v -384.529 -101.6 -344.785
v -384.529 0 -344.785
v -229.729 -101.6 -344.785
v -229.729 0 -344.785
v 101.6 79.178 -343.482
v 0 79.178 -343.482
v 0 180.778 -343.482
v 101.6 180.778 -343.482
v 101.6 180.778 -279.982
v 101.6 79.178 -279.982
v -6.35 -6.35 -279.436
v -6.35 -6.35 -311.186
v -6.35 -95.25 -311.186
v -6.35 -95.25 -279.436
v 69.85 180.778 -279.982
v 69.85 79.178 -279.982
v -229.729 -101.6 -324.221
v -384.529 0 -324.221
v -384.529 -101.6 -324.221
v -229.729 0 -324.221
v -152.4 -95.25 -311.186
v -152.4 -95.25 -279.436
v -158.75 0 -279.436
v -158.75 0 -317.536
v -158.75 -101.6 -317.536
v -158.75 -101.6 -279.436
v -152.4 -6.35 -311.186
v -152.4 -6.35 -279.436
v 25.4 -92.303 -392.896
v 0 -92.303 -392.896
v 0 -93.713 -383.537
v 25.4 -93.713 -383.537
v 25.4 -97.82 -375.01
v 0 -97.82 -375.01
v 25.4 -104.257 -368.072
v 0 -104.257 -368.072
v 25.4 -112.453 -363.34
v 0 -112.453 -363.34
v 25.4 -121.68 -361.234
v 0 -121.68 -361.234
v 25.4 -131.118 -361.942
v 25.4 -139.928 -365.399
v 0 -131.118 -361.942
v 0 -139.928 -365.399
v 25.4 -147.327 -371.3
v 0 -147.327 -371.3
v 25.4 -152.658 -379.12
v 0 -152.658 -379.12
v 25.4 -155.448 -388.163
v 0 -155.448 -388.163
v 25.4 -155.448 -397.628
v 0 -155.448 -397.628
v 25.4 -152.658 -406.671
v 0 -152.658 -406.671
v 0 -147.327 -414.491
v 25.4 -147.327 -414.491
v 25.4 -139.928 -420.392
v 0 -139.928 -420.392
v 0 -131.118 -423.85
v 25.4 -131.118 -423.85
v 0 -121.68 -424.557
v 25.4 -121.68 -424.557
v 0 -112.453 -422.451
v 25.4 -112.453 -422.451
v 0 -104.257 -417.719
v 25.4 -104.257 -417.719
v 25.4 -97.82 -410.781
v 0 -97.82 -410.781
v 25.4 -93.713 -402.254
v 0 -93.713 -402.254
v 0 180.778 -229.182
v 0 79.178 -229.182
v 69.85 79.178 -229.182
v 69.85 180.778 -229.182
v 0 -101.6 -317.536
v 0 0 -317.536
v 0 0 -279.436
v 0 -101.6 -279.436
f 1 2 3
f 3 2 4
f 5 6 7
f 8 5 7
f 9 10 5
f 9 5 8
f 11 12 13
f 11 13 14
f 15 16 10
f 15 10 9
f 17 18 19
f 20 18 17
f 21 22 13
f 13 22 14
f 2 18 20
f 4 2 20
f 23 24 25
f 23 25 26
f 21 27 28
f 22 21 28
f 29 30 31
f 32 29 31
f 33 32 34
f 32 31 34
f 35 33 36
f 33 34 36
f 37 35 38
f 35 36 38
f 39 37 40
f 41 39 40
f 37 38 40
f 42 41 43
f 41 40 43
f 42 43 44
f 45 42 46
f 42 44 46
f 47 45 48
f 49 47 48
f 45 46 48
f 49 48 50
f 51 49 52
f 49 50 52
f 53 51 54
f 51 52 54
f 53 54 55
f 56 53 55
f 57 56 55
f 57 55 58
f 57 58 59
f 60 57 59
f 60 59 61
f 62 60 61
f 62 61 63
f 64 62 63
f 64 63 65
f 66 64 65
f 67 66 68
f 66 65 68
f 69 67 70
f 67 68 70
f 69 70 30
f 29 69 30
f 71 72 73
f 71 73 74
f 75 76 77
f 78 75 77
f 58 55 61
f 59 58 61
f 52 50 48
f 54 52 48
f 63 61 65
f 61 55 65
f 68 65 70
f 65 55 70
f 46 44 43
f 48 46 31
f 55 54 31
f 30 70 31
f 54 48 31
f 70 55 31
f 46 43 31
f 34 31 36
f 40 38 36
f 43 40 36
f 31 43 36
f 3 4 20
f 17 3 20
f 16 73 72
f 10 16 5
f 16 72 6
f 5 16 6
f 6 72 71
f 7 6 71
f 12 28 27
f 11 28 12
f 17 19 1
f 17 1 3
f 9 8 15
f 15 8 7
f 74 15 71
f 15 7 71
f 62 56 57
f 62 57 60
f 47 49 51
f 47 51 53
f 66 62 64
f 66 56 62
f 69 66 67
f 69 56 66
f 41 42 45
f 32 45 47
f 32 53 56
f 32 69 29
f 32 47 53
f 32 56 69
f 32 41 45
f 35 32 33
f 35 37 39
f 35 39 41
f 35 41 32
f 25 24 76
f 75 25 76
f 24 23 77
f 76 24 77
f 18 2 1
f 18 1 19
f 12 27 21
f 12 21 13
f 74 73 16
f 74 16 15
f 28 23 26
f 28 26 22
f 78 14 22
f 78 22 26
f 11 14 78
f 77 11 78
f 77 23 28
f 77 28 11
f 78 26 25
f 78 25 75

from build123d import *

# Parameters (mm, degrees)
F0_W     = 101.6
F0_H     = 63.5
F1_DEPTH = 101.6
F0_H_2   = 50.8
F2_DEPTH = 69.85
F3_W     = 158.75
F3_H     = 38.1
F4_DEPTH = 101.6
F3_W_2   = 154.7997891903
F3_H_2   = 20.5638110638
F5_R     = 31.75
F6_DEPTH = 25.4
F7_T     = -6.35


with BuildPart() as f1:
    # F0 (on Right) → F1 (new body)
    with BuildSketch(Plane.YZ):
        with Locations((129.9776777284, -311.7317557335)):
            Rectangle(F0_W, F0_H)
    extrude(amount=F1_DEPTH)

    # F0 (on Right) → F2 (join)
    with BuildSketch(Plane.YZ):
        with Locations((129.9776777284, -254.5817557335)):
            Rectangle(F0_W, F0_H_2)
        with Locations((129.9776777284, -311.7317557335)):
            Rectangle(F0_W, F0_H)
    extrude(amount=F2_DEPTH)


with BuildPart() as f4:
    # F3 (on Front) → F4 (new body)
    with BuildSketch(Plane.XZ):
        with Locations((-79.375, -298.4855981173)):
            Rectangle(F3_W, F3_H)
    extrude(amount=F4_DEPTH)

    # F7
    f7_openings = [f4.faces().sort_by_distance(p)[0] for p in [
        (-79.375, -50.8, -279.435598),
    ]]
    offset(amount=F7_T, openings=f7_openings)


with BuildPart() as f4b:
    # F3 (on Front) → F4, piece 2 (new body)
    with BuildSketch(Plane.XZ):
        with Locations((-307.129368186, -334.5033377409)):
            Rectangle(F3_W_2, F3_H_2)
    extrude(amount=F4_DEPTH)


with BuildPart() as f6:
    # F5 (on Right) → F6 (new body)
    with BuildSketch(Plane.YZ):
        with Locations((-124.0526214242, -392.8955793381)):
            Circle(F5_R)
    extrude(amount=F6_DEPTH)


solid = Compound([f1.part, f4.part, f4b.part, f6.part])
